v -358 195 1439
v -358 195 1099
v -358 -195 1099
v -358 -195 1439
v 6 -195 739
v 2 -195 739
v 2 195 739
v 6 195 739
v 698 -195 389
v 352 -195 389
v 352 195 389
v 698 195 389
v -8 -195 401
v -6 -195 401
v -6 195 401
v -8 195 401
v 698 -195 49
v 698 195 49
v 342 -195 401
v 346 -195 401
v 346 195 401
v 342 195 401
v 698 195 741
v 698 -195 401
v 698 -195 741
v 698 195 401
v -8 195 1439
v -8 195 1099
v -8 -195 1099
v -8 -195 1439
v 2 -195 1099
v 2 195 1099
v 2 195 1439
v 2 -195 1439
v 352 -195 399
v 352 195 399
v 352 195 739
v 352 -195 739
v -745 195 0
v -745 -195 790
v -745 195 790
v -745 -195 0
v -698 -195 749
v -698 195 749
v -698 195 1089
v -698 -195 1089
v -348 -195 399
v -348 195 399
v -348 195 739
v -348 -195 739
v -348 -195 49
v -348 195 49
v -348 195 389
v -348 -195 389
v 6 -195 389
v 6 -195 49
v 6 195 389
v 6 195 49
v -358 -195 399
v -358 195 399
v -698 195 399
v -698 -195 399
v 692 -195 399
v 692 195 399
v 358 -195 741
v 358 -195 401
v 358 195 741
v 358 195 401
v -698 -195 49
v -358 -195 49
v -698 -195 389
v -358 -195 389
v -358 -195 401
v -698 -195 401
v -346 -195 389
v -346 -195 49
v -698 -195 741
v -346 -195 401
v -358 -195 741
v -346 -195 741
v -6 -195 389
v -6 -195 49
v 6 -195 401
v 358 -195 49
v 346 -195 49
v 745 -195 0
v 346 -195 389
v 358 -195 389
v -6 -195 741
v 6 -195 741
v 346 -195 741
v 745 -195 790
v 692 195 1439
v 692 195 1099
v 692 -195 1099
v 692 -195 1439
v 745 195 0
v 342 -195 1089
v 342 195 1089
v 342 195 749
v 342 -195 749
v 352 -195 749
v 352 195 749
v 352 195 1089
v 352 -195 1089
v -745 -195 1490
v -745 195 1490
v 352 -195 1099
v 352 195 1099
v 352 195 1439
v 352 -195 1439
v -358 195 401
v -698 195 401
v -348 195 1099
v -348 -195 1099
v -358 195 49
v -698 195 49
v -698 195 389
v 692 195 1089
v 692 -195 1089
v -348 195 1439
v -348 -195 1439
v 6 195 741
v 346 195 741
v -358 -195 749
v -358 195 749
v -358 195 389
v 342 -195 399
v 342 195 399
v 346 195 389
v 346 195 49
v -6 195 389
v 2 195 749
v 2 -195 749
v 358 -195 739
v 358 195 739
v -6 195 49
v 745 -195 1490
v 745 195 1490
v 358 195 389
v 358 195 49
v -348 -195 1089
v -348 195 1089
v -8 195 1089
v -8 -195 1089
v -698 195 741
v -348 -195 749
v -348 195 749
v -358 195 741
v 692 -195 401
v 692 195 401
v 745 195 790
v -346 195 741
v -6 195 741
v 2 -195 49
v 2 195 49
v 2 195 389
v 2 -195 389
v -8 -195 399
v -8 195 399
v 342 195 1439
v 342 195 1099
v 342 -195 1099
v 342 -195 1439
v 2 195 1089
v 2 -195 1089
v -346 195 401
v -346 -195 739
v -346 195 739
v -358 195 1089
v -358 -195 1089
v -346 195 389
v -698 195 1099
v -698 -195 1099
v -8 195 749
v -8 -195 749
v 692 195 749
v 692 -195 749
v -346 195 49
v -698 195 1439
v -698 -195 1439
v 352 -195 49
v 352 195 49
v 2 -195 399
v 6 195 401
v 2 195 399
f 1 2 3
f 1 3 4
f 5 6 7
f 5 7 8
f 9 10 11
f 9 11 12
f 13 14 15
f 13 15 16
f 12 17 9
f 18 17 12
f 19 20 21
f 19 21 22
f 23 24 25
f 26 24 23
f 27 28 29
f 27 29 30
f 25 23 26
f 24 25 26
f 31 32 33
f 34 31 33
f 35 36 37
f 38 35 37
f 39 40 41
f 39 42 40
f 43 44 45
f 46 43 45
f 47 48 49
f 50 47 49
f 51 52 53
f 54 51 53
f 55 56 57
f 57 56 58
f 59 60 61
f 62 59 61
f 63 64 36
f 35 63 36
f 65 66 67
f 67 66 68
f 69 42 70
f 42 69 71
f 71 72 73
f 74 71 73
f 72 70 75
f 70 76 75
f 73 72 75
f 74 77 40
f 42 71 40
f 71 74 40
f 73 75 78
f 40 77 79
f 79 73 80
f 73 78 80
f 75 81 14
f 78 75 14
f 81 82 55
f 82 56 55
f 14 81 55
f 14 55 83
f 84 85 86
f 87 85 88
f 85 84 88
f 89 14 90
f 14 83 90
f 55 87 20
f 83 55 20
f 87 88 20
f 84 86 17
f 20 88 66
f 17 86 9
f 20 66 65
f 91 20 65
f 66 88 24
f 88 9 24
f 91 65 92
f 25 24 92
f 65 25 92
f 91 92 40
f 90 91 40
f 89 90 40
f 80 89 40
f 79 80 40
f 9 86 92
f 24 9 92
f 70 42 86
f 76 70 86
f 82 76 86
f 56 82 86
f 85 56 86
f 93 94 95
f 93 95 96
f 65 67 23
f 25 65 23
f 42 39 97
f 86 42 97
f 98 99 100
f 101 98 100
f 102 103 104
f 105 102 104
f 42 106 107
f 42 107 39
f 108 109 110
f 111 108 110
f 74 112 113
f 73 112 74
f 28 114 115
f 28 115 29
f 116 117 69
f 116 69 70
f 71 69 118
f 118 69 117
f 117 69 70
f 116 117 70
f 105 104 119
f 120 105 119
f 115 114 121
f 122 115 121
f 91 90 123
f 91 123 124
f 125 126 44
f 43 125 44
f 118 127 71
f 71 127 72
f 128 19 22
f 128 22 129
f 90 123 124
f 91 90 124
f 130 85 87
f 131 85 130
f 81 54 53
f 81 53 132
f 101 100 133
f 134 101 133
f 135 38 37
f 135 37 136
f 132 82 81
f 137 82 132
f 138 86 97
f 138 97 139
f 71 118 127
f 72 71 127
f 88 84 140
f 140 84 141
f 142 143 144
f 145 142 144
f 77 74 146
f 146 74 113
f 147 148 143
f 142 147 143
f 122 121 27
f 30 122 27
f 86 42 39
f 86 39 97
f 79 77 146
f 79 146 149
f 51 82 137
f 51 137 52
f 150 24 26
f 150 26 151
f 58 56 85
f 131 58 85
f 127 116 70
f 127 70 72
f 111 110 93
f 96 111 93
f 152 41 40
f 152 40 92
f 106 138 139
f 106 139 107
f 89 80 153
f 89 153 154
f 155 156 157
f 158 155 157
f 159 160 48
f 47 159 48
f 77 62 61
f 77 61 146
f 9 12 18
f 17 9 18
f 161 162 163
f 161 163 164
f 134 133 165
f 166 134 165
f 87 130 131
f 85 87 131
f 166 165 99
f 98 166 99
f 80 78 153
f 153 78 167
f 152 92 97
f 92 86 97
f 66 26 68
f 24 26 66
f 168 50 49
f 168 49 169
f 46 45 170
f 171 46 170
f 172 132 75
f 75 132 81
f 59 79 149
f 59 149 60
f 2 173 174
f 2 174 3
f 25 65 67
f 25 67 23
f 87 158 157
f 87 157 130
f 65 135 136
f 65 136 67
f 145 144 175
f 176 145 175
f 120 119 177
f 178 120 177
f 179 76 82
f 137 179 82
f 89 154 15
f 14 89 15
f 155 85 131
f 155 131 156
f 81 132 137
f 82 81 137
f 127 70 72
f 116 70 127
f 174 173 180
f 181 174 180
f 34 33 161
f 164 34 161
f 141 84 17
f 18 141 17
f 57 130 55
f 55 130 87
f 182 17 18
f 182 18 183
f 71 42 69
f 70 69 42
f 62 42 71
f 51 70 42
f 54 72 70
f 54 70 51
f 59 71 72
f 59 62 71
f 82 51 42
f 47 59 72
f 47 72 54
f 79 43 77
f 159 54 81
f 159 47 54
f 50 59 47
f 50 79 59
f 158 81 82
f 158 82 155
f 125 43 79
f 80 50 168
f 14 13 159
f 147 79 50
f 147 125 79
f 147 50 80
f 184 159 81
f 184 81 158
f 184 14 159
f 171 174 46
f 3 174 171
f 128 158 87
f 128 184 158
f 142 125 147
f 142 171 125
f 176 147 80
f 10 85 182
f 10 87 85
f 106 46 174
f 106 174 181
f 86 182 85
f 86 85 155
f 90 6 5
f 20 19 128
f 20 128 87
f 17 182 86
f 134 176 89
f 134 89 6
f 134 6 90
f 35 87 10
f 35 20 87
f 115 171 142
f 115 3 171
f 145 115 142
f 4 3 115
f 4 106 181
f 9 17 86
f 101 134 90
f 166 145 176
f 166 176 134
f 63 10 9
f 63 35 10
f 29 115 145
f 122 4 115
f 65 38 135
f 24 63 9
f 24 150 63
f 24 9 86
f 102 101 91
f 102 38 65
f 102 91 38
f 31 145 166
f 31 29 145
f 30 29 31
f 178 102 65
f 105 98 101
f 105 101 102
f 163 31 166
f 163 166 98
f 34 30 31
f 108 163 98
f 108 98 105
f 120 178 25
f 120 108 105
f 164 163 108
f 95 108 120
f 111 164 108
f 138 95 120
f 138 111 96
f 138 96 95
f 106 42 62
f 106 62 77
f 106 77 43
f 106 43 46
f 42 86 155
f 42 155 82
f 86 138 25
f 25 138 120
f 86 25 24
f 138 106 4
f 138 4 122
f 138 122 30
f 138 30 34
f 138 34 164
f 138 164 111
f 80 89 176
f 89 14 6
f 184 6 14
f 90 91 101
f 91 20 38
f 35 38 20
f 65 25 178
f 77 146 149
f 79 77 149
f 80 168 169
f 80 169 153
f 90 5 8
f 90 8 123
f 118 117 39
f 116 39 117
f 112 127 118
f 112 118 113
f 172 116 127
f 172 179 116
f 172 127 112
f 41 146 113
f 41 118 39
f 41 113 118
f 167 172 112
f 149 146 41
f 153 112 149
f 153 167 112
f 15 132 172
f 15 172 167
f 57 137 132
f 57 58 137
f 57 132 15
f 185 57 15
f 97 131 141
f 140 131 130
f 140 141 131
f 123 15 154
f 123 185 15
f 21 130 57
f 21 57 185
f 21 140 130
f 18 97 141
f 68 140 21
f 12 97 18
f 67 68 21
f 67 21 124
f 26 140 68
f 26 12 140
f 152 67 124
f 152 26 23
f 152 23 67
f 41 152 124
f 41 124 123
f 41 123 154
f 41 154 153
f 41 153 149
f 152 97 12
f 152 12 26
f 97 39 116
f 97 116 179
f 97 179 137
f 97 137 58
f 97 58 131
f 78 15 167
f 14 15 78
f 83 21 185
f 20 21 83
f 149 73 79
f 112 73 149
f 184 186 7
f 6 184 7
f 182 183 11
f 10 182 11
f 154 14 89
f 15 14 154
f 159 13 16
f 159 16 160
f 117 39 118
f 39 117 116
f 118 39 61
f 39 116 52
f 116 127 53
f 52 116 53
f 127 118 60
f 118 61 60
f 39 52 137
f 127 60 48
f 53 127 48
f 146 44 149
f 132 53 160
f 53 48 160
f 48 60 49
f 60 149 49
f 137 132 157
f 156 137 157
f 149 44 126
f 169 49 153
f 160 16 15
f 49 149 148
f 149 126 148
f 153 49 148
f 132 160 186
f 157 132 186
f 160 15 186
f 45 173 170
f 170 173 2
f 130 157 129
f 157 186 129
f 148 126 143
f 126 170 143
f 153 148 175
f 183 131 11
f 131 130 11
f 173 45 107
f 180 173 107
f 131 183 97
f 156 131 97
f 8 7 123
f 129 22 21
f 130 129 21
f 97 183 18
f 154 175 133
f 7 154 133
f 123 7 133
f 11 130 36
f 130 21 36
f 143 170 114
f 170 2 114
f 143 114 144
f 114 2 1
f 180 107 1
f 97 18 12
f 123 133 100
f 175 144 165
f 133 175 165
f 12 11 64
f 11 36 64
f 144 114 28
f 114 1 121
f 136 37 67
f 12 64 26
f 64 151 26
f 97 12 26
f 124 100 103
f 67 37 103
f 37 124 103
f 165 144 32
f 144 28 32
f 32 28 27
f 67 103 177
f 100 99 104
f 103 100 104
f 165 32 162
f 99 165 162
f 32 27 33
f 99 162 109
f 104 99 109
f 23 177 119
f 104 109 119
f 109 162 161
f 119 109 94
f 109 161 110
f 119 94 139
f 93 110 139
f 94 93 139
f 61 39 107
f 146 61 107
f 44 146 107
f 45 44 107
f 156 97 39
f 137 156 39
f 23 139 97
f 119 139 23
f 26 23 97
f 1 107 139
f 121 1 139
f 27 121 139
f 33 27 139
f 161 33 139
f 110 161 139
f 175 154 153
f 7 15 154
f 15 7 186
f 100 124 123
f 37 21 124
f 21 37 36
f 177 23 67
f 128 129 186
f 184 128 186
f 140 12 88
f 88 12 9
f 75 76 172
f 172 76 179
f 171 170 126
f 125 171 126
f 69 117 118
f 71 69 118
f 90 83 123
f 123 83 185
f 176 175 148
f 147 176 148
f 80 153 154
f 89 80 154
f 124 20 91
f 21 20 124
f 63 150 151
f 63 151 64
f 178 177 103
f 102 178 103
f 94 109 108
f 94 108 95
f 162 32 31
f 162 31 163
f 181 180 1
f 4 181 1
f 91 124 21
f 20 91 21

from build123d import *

# Parameters (mm, degrees)
F0_W     = 1490
F0_H     = 390
F1_DEPTH = 49
F2_W     = 47
F2_H     = 390
F2_W_2   = 12
F3_DEPTH = 692
F4_W     = 1490
F4_H     = 390
F5_DEPTH = 49
F6_W     = 390
F6_H     = 12
F7_DEPTH = 1410
F8_W     = 340
F8_H     = 340
F9_DEPTH = 390


with BuildPart() as f1:
    # F0 (on Top) → F1 (new body)
    with BuildSketch(Plane.XY):
        Rectangle(F0_W, F0_H)
    extrude(amount=F1_DEPTH)

    # F2 (on face) → F3 (join)
    with BuildSketch(Plane.XY.offset(49)):
        with Locations((-721.5, 0)):
            Rectangle(F2_W, F2_H)
        with Locations((721.5, 0)):
            Rectangle(F2_W, F2_H)
        with Locations((352, 0)):
            Rectangle(F2_W_2, F2_H)
        Rectangle(F2_W_2, F2_H)
        with Locations((-352, 0)):
            Rectangle(F2_W_2, F2_H)
    extrude(amount=F3_DEPTH)

    # F4 (on face) → F5 (join)
    with BuildSketch(Plane.XY.offset(741)):
        Rectangle(F4_W, F4_H)
    extrude(amount=F5_DEPTH)

    # F6 (on face) → F7 (join)
    with BuildSketch(Plane(origin=(698, 0, 0), x_dir=(0, -1, 0), z_dir=(-1, 0, 0))):
        with Locations((0, 395)):
            Rectangle(F6_W, F6_H)
    extrude(amount=F7_DEPTH)


with BuildPart() as f9:
    # F8 (on face) → F9 (new body)
    with BuildSketch(Plane.XZ.offset(195)):
        Polygon((-745, 1490), (-745, 790), (-698, 790), (-698, 1089), (-358, 1089), (-358, 790), (-348, 790), (-348, 1089), (-8, 1089), (-8, 790), (2, 790), (2, 1089), (342, 1089), (342, 790), (352, 790), (352, 1089), (692, 1089), (692, 790), (745, 790), (745, 1490), align=None)
        with Locations((-528, 1269)):
            Rectangle(F8_W, F8_H, mode=Mode.SUBTRACT)
        with Locations((-178, 1269)):
            Rectangle(F8_W, F8_H, mode=Mode.SUBTRACT)
        with Locations((172, 1269)):
            Rectangle(F8_W, F8_H, mode=Mode.SUBTRACT)
        with Locations((522, 1269)):
            Rectangle(F8_W, F8_H, mode=Mode.SUBTRACT)
        Polygon((-745, 790), (-745, 0), (745, 0), (745, 790), (692, 790), (692, 749), (352, 749), (352, 790), (342, 790), (342, 749), (2, 749), (2, 790), (-8, 790), (-8, 749), (-348, 749), (-348, 790), (-358, 790), (-358, 749), (-698, 749), (-698, 790), align=None)
        with Locations((-528, 219)):
            Rectangle(F8_W, F8_H, mode=Mode.SUBTRACT)
        Polygon((-346, 49), (-348, 49), (-348, 389), (-346, 389), (-8, 389), (-6, 389), (-6, 49), (-8, 49), align=None, mode=Mode.SUBTRACT)
        Polygon((-358, 399), (-698, 399), (-698, 401), (-698, 739), (-698, 741), (-358, 741), (-358, 739), (-358, 401), align=None, mode=Mode.SUBTRACT)
        Polygon((-8, 399), (-348, 399), (-348, 739), (-346, 739), (-346, 741), (-6, 741), (-6, 401), (-8, 401), align=None, mode=Mode.SUBTRACT)
        Polygon((6, 49), (2, 49), (2, 389), (6, 389), (342, 389), (346, 389), (346, 49), (342, 49), align=None, mode=Mode.SUBTRACT)
        Polygon((358, 49), (352, 49), (352, 389), (358, 389), (692, 389), (698, 389), (698, 49), (692, 49), align=None, mode=Mode.SUBTRACT)
        Polygon((342, 399), (2, 399), (2, 739), (6, 739), (6, 741), (346, 741), (346, 401), (342, 401), align=None, mode=Mode.SUBTRACT)
        Polygon((692, 399), (352, 399), (352, 739), (358, 739), (358, 741), (698, 741), (698, 401), (692, 401), align=None, mode=Mode.SUBTRACT)
    extrude(amount=-F9_DEPTH)


solid = Compound([f1.part, f9.part])
